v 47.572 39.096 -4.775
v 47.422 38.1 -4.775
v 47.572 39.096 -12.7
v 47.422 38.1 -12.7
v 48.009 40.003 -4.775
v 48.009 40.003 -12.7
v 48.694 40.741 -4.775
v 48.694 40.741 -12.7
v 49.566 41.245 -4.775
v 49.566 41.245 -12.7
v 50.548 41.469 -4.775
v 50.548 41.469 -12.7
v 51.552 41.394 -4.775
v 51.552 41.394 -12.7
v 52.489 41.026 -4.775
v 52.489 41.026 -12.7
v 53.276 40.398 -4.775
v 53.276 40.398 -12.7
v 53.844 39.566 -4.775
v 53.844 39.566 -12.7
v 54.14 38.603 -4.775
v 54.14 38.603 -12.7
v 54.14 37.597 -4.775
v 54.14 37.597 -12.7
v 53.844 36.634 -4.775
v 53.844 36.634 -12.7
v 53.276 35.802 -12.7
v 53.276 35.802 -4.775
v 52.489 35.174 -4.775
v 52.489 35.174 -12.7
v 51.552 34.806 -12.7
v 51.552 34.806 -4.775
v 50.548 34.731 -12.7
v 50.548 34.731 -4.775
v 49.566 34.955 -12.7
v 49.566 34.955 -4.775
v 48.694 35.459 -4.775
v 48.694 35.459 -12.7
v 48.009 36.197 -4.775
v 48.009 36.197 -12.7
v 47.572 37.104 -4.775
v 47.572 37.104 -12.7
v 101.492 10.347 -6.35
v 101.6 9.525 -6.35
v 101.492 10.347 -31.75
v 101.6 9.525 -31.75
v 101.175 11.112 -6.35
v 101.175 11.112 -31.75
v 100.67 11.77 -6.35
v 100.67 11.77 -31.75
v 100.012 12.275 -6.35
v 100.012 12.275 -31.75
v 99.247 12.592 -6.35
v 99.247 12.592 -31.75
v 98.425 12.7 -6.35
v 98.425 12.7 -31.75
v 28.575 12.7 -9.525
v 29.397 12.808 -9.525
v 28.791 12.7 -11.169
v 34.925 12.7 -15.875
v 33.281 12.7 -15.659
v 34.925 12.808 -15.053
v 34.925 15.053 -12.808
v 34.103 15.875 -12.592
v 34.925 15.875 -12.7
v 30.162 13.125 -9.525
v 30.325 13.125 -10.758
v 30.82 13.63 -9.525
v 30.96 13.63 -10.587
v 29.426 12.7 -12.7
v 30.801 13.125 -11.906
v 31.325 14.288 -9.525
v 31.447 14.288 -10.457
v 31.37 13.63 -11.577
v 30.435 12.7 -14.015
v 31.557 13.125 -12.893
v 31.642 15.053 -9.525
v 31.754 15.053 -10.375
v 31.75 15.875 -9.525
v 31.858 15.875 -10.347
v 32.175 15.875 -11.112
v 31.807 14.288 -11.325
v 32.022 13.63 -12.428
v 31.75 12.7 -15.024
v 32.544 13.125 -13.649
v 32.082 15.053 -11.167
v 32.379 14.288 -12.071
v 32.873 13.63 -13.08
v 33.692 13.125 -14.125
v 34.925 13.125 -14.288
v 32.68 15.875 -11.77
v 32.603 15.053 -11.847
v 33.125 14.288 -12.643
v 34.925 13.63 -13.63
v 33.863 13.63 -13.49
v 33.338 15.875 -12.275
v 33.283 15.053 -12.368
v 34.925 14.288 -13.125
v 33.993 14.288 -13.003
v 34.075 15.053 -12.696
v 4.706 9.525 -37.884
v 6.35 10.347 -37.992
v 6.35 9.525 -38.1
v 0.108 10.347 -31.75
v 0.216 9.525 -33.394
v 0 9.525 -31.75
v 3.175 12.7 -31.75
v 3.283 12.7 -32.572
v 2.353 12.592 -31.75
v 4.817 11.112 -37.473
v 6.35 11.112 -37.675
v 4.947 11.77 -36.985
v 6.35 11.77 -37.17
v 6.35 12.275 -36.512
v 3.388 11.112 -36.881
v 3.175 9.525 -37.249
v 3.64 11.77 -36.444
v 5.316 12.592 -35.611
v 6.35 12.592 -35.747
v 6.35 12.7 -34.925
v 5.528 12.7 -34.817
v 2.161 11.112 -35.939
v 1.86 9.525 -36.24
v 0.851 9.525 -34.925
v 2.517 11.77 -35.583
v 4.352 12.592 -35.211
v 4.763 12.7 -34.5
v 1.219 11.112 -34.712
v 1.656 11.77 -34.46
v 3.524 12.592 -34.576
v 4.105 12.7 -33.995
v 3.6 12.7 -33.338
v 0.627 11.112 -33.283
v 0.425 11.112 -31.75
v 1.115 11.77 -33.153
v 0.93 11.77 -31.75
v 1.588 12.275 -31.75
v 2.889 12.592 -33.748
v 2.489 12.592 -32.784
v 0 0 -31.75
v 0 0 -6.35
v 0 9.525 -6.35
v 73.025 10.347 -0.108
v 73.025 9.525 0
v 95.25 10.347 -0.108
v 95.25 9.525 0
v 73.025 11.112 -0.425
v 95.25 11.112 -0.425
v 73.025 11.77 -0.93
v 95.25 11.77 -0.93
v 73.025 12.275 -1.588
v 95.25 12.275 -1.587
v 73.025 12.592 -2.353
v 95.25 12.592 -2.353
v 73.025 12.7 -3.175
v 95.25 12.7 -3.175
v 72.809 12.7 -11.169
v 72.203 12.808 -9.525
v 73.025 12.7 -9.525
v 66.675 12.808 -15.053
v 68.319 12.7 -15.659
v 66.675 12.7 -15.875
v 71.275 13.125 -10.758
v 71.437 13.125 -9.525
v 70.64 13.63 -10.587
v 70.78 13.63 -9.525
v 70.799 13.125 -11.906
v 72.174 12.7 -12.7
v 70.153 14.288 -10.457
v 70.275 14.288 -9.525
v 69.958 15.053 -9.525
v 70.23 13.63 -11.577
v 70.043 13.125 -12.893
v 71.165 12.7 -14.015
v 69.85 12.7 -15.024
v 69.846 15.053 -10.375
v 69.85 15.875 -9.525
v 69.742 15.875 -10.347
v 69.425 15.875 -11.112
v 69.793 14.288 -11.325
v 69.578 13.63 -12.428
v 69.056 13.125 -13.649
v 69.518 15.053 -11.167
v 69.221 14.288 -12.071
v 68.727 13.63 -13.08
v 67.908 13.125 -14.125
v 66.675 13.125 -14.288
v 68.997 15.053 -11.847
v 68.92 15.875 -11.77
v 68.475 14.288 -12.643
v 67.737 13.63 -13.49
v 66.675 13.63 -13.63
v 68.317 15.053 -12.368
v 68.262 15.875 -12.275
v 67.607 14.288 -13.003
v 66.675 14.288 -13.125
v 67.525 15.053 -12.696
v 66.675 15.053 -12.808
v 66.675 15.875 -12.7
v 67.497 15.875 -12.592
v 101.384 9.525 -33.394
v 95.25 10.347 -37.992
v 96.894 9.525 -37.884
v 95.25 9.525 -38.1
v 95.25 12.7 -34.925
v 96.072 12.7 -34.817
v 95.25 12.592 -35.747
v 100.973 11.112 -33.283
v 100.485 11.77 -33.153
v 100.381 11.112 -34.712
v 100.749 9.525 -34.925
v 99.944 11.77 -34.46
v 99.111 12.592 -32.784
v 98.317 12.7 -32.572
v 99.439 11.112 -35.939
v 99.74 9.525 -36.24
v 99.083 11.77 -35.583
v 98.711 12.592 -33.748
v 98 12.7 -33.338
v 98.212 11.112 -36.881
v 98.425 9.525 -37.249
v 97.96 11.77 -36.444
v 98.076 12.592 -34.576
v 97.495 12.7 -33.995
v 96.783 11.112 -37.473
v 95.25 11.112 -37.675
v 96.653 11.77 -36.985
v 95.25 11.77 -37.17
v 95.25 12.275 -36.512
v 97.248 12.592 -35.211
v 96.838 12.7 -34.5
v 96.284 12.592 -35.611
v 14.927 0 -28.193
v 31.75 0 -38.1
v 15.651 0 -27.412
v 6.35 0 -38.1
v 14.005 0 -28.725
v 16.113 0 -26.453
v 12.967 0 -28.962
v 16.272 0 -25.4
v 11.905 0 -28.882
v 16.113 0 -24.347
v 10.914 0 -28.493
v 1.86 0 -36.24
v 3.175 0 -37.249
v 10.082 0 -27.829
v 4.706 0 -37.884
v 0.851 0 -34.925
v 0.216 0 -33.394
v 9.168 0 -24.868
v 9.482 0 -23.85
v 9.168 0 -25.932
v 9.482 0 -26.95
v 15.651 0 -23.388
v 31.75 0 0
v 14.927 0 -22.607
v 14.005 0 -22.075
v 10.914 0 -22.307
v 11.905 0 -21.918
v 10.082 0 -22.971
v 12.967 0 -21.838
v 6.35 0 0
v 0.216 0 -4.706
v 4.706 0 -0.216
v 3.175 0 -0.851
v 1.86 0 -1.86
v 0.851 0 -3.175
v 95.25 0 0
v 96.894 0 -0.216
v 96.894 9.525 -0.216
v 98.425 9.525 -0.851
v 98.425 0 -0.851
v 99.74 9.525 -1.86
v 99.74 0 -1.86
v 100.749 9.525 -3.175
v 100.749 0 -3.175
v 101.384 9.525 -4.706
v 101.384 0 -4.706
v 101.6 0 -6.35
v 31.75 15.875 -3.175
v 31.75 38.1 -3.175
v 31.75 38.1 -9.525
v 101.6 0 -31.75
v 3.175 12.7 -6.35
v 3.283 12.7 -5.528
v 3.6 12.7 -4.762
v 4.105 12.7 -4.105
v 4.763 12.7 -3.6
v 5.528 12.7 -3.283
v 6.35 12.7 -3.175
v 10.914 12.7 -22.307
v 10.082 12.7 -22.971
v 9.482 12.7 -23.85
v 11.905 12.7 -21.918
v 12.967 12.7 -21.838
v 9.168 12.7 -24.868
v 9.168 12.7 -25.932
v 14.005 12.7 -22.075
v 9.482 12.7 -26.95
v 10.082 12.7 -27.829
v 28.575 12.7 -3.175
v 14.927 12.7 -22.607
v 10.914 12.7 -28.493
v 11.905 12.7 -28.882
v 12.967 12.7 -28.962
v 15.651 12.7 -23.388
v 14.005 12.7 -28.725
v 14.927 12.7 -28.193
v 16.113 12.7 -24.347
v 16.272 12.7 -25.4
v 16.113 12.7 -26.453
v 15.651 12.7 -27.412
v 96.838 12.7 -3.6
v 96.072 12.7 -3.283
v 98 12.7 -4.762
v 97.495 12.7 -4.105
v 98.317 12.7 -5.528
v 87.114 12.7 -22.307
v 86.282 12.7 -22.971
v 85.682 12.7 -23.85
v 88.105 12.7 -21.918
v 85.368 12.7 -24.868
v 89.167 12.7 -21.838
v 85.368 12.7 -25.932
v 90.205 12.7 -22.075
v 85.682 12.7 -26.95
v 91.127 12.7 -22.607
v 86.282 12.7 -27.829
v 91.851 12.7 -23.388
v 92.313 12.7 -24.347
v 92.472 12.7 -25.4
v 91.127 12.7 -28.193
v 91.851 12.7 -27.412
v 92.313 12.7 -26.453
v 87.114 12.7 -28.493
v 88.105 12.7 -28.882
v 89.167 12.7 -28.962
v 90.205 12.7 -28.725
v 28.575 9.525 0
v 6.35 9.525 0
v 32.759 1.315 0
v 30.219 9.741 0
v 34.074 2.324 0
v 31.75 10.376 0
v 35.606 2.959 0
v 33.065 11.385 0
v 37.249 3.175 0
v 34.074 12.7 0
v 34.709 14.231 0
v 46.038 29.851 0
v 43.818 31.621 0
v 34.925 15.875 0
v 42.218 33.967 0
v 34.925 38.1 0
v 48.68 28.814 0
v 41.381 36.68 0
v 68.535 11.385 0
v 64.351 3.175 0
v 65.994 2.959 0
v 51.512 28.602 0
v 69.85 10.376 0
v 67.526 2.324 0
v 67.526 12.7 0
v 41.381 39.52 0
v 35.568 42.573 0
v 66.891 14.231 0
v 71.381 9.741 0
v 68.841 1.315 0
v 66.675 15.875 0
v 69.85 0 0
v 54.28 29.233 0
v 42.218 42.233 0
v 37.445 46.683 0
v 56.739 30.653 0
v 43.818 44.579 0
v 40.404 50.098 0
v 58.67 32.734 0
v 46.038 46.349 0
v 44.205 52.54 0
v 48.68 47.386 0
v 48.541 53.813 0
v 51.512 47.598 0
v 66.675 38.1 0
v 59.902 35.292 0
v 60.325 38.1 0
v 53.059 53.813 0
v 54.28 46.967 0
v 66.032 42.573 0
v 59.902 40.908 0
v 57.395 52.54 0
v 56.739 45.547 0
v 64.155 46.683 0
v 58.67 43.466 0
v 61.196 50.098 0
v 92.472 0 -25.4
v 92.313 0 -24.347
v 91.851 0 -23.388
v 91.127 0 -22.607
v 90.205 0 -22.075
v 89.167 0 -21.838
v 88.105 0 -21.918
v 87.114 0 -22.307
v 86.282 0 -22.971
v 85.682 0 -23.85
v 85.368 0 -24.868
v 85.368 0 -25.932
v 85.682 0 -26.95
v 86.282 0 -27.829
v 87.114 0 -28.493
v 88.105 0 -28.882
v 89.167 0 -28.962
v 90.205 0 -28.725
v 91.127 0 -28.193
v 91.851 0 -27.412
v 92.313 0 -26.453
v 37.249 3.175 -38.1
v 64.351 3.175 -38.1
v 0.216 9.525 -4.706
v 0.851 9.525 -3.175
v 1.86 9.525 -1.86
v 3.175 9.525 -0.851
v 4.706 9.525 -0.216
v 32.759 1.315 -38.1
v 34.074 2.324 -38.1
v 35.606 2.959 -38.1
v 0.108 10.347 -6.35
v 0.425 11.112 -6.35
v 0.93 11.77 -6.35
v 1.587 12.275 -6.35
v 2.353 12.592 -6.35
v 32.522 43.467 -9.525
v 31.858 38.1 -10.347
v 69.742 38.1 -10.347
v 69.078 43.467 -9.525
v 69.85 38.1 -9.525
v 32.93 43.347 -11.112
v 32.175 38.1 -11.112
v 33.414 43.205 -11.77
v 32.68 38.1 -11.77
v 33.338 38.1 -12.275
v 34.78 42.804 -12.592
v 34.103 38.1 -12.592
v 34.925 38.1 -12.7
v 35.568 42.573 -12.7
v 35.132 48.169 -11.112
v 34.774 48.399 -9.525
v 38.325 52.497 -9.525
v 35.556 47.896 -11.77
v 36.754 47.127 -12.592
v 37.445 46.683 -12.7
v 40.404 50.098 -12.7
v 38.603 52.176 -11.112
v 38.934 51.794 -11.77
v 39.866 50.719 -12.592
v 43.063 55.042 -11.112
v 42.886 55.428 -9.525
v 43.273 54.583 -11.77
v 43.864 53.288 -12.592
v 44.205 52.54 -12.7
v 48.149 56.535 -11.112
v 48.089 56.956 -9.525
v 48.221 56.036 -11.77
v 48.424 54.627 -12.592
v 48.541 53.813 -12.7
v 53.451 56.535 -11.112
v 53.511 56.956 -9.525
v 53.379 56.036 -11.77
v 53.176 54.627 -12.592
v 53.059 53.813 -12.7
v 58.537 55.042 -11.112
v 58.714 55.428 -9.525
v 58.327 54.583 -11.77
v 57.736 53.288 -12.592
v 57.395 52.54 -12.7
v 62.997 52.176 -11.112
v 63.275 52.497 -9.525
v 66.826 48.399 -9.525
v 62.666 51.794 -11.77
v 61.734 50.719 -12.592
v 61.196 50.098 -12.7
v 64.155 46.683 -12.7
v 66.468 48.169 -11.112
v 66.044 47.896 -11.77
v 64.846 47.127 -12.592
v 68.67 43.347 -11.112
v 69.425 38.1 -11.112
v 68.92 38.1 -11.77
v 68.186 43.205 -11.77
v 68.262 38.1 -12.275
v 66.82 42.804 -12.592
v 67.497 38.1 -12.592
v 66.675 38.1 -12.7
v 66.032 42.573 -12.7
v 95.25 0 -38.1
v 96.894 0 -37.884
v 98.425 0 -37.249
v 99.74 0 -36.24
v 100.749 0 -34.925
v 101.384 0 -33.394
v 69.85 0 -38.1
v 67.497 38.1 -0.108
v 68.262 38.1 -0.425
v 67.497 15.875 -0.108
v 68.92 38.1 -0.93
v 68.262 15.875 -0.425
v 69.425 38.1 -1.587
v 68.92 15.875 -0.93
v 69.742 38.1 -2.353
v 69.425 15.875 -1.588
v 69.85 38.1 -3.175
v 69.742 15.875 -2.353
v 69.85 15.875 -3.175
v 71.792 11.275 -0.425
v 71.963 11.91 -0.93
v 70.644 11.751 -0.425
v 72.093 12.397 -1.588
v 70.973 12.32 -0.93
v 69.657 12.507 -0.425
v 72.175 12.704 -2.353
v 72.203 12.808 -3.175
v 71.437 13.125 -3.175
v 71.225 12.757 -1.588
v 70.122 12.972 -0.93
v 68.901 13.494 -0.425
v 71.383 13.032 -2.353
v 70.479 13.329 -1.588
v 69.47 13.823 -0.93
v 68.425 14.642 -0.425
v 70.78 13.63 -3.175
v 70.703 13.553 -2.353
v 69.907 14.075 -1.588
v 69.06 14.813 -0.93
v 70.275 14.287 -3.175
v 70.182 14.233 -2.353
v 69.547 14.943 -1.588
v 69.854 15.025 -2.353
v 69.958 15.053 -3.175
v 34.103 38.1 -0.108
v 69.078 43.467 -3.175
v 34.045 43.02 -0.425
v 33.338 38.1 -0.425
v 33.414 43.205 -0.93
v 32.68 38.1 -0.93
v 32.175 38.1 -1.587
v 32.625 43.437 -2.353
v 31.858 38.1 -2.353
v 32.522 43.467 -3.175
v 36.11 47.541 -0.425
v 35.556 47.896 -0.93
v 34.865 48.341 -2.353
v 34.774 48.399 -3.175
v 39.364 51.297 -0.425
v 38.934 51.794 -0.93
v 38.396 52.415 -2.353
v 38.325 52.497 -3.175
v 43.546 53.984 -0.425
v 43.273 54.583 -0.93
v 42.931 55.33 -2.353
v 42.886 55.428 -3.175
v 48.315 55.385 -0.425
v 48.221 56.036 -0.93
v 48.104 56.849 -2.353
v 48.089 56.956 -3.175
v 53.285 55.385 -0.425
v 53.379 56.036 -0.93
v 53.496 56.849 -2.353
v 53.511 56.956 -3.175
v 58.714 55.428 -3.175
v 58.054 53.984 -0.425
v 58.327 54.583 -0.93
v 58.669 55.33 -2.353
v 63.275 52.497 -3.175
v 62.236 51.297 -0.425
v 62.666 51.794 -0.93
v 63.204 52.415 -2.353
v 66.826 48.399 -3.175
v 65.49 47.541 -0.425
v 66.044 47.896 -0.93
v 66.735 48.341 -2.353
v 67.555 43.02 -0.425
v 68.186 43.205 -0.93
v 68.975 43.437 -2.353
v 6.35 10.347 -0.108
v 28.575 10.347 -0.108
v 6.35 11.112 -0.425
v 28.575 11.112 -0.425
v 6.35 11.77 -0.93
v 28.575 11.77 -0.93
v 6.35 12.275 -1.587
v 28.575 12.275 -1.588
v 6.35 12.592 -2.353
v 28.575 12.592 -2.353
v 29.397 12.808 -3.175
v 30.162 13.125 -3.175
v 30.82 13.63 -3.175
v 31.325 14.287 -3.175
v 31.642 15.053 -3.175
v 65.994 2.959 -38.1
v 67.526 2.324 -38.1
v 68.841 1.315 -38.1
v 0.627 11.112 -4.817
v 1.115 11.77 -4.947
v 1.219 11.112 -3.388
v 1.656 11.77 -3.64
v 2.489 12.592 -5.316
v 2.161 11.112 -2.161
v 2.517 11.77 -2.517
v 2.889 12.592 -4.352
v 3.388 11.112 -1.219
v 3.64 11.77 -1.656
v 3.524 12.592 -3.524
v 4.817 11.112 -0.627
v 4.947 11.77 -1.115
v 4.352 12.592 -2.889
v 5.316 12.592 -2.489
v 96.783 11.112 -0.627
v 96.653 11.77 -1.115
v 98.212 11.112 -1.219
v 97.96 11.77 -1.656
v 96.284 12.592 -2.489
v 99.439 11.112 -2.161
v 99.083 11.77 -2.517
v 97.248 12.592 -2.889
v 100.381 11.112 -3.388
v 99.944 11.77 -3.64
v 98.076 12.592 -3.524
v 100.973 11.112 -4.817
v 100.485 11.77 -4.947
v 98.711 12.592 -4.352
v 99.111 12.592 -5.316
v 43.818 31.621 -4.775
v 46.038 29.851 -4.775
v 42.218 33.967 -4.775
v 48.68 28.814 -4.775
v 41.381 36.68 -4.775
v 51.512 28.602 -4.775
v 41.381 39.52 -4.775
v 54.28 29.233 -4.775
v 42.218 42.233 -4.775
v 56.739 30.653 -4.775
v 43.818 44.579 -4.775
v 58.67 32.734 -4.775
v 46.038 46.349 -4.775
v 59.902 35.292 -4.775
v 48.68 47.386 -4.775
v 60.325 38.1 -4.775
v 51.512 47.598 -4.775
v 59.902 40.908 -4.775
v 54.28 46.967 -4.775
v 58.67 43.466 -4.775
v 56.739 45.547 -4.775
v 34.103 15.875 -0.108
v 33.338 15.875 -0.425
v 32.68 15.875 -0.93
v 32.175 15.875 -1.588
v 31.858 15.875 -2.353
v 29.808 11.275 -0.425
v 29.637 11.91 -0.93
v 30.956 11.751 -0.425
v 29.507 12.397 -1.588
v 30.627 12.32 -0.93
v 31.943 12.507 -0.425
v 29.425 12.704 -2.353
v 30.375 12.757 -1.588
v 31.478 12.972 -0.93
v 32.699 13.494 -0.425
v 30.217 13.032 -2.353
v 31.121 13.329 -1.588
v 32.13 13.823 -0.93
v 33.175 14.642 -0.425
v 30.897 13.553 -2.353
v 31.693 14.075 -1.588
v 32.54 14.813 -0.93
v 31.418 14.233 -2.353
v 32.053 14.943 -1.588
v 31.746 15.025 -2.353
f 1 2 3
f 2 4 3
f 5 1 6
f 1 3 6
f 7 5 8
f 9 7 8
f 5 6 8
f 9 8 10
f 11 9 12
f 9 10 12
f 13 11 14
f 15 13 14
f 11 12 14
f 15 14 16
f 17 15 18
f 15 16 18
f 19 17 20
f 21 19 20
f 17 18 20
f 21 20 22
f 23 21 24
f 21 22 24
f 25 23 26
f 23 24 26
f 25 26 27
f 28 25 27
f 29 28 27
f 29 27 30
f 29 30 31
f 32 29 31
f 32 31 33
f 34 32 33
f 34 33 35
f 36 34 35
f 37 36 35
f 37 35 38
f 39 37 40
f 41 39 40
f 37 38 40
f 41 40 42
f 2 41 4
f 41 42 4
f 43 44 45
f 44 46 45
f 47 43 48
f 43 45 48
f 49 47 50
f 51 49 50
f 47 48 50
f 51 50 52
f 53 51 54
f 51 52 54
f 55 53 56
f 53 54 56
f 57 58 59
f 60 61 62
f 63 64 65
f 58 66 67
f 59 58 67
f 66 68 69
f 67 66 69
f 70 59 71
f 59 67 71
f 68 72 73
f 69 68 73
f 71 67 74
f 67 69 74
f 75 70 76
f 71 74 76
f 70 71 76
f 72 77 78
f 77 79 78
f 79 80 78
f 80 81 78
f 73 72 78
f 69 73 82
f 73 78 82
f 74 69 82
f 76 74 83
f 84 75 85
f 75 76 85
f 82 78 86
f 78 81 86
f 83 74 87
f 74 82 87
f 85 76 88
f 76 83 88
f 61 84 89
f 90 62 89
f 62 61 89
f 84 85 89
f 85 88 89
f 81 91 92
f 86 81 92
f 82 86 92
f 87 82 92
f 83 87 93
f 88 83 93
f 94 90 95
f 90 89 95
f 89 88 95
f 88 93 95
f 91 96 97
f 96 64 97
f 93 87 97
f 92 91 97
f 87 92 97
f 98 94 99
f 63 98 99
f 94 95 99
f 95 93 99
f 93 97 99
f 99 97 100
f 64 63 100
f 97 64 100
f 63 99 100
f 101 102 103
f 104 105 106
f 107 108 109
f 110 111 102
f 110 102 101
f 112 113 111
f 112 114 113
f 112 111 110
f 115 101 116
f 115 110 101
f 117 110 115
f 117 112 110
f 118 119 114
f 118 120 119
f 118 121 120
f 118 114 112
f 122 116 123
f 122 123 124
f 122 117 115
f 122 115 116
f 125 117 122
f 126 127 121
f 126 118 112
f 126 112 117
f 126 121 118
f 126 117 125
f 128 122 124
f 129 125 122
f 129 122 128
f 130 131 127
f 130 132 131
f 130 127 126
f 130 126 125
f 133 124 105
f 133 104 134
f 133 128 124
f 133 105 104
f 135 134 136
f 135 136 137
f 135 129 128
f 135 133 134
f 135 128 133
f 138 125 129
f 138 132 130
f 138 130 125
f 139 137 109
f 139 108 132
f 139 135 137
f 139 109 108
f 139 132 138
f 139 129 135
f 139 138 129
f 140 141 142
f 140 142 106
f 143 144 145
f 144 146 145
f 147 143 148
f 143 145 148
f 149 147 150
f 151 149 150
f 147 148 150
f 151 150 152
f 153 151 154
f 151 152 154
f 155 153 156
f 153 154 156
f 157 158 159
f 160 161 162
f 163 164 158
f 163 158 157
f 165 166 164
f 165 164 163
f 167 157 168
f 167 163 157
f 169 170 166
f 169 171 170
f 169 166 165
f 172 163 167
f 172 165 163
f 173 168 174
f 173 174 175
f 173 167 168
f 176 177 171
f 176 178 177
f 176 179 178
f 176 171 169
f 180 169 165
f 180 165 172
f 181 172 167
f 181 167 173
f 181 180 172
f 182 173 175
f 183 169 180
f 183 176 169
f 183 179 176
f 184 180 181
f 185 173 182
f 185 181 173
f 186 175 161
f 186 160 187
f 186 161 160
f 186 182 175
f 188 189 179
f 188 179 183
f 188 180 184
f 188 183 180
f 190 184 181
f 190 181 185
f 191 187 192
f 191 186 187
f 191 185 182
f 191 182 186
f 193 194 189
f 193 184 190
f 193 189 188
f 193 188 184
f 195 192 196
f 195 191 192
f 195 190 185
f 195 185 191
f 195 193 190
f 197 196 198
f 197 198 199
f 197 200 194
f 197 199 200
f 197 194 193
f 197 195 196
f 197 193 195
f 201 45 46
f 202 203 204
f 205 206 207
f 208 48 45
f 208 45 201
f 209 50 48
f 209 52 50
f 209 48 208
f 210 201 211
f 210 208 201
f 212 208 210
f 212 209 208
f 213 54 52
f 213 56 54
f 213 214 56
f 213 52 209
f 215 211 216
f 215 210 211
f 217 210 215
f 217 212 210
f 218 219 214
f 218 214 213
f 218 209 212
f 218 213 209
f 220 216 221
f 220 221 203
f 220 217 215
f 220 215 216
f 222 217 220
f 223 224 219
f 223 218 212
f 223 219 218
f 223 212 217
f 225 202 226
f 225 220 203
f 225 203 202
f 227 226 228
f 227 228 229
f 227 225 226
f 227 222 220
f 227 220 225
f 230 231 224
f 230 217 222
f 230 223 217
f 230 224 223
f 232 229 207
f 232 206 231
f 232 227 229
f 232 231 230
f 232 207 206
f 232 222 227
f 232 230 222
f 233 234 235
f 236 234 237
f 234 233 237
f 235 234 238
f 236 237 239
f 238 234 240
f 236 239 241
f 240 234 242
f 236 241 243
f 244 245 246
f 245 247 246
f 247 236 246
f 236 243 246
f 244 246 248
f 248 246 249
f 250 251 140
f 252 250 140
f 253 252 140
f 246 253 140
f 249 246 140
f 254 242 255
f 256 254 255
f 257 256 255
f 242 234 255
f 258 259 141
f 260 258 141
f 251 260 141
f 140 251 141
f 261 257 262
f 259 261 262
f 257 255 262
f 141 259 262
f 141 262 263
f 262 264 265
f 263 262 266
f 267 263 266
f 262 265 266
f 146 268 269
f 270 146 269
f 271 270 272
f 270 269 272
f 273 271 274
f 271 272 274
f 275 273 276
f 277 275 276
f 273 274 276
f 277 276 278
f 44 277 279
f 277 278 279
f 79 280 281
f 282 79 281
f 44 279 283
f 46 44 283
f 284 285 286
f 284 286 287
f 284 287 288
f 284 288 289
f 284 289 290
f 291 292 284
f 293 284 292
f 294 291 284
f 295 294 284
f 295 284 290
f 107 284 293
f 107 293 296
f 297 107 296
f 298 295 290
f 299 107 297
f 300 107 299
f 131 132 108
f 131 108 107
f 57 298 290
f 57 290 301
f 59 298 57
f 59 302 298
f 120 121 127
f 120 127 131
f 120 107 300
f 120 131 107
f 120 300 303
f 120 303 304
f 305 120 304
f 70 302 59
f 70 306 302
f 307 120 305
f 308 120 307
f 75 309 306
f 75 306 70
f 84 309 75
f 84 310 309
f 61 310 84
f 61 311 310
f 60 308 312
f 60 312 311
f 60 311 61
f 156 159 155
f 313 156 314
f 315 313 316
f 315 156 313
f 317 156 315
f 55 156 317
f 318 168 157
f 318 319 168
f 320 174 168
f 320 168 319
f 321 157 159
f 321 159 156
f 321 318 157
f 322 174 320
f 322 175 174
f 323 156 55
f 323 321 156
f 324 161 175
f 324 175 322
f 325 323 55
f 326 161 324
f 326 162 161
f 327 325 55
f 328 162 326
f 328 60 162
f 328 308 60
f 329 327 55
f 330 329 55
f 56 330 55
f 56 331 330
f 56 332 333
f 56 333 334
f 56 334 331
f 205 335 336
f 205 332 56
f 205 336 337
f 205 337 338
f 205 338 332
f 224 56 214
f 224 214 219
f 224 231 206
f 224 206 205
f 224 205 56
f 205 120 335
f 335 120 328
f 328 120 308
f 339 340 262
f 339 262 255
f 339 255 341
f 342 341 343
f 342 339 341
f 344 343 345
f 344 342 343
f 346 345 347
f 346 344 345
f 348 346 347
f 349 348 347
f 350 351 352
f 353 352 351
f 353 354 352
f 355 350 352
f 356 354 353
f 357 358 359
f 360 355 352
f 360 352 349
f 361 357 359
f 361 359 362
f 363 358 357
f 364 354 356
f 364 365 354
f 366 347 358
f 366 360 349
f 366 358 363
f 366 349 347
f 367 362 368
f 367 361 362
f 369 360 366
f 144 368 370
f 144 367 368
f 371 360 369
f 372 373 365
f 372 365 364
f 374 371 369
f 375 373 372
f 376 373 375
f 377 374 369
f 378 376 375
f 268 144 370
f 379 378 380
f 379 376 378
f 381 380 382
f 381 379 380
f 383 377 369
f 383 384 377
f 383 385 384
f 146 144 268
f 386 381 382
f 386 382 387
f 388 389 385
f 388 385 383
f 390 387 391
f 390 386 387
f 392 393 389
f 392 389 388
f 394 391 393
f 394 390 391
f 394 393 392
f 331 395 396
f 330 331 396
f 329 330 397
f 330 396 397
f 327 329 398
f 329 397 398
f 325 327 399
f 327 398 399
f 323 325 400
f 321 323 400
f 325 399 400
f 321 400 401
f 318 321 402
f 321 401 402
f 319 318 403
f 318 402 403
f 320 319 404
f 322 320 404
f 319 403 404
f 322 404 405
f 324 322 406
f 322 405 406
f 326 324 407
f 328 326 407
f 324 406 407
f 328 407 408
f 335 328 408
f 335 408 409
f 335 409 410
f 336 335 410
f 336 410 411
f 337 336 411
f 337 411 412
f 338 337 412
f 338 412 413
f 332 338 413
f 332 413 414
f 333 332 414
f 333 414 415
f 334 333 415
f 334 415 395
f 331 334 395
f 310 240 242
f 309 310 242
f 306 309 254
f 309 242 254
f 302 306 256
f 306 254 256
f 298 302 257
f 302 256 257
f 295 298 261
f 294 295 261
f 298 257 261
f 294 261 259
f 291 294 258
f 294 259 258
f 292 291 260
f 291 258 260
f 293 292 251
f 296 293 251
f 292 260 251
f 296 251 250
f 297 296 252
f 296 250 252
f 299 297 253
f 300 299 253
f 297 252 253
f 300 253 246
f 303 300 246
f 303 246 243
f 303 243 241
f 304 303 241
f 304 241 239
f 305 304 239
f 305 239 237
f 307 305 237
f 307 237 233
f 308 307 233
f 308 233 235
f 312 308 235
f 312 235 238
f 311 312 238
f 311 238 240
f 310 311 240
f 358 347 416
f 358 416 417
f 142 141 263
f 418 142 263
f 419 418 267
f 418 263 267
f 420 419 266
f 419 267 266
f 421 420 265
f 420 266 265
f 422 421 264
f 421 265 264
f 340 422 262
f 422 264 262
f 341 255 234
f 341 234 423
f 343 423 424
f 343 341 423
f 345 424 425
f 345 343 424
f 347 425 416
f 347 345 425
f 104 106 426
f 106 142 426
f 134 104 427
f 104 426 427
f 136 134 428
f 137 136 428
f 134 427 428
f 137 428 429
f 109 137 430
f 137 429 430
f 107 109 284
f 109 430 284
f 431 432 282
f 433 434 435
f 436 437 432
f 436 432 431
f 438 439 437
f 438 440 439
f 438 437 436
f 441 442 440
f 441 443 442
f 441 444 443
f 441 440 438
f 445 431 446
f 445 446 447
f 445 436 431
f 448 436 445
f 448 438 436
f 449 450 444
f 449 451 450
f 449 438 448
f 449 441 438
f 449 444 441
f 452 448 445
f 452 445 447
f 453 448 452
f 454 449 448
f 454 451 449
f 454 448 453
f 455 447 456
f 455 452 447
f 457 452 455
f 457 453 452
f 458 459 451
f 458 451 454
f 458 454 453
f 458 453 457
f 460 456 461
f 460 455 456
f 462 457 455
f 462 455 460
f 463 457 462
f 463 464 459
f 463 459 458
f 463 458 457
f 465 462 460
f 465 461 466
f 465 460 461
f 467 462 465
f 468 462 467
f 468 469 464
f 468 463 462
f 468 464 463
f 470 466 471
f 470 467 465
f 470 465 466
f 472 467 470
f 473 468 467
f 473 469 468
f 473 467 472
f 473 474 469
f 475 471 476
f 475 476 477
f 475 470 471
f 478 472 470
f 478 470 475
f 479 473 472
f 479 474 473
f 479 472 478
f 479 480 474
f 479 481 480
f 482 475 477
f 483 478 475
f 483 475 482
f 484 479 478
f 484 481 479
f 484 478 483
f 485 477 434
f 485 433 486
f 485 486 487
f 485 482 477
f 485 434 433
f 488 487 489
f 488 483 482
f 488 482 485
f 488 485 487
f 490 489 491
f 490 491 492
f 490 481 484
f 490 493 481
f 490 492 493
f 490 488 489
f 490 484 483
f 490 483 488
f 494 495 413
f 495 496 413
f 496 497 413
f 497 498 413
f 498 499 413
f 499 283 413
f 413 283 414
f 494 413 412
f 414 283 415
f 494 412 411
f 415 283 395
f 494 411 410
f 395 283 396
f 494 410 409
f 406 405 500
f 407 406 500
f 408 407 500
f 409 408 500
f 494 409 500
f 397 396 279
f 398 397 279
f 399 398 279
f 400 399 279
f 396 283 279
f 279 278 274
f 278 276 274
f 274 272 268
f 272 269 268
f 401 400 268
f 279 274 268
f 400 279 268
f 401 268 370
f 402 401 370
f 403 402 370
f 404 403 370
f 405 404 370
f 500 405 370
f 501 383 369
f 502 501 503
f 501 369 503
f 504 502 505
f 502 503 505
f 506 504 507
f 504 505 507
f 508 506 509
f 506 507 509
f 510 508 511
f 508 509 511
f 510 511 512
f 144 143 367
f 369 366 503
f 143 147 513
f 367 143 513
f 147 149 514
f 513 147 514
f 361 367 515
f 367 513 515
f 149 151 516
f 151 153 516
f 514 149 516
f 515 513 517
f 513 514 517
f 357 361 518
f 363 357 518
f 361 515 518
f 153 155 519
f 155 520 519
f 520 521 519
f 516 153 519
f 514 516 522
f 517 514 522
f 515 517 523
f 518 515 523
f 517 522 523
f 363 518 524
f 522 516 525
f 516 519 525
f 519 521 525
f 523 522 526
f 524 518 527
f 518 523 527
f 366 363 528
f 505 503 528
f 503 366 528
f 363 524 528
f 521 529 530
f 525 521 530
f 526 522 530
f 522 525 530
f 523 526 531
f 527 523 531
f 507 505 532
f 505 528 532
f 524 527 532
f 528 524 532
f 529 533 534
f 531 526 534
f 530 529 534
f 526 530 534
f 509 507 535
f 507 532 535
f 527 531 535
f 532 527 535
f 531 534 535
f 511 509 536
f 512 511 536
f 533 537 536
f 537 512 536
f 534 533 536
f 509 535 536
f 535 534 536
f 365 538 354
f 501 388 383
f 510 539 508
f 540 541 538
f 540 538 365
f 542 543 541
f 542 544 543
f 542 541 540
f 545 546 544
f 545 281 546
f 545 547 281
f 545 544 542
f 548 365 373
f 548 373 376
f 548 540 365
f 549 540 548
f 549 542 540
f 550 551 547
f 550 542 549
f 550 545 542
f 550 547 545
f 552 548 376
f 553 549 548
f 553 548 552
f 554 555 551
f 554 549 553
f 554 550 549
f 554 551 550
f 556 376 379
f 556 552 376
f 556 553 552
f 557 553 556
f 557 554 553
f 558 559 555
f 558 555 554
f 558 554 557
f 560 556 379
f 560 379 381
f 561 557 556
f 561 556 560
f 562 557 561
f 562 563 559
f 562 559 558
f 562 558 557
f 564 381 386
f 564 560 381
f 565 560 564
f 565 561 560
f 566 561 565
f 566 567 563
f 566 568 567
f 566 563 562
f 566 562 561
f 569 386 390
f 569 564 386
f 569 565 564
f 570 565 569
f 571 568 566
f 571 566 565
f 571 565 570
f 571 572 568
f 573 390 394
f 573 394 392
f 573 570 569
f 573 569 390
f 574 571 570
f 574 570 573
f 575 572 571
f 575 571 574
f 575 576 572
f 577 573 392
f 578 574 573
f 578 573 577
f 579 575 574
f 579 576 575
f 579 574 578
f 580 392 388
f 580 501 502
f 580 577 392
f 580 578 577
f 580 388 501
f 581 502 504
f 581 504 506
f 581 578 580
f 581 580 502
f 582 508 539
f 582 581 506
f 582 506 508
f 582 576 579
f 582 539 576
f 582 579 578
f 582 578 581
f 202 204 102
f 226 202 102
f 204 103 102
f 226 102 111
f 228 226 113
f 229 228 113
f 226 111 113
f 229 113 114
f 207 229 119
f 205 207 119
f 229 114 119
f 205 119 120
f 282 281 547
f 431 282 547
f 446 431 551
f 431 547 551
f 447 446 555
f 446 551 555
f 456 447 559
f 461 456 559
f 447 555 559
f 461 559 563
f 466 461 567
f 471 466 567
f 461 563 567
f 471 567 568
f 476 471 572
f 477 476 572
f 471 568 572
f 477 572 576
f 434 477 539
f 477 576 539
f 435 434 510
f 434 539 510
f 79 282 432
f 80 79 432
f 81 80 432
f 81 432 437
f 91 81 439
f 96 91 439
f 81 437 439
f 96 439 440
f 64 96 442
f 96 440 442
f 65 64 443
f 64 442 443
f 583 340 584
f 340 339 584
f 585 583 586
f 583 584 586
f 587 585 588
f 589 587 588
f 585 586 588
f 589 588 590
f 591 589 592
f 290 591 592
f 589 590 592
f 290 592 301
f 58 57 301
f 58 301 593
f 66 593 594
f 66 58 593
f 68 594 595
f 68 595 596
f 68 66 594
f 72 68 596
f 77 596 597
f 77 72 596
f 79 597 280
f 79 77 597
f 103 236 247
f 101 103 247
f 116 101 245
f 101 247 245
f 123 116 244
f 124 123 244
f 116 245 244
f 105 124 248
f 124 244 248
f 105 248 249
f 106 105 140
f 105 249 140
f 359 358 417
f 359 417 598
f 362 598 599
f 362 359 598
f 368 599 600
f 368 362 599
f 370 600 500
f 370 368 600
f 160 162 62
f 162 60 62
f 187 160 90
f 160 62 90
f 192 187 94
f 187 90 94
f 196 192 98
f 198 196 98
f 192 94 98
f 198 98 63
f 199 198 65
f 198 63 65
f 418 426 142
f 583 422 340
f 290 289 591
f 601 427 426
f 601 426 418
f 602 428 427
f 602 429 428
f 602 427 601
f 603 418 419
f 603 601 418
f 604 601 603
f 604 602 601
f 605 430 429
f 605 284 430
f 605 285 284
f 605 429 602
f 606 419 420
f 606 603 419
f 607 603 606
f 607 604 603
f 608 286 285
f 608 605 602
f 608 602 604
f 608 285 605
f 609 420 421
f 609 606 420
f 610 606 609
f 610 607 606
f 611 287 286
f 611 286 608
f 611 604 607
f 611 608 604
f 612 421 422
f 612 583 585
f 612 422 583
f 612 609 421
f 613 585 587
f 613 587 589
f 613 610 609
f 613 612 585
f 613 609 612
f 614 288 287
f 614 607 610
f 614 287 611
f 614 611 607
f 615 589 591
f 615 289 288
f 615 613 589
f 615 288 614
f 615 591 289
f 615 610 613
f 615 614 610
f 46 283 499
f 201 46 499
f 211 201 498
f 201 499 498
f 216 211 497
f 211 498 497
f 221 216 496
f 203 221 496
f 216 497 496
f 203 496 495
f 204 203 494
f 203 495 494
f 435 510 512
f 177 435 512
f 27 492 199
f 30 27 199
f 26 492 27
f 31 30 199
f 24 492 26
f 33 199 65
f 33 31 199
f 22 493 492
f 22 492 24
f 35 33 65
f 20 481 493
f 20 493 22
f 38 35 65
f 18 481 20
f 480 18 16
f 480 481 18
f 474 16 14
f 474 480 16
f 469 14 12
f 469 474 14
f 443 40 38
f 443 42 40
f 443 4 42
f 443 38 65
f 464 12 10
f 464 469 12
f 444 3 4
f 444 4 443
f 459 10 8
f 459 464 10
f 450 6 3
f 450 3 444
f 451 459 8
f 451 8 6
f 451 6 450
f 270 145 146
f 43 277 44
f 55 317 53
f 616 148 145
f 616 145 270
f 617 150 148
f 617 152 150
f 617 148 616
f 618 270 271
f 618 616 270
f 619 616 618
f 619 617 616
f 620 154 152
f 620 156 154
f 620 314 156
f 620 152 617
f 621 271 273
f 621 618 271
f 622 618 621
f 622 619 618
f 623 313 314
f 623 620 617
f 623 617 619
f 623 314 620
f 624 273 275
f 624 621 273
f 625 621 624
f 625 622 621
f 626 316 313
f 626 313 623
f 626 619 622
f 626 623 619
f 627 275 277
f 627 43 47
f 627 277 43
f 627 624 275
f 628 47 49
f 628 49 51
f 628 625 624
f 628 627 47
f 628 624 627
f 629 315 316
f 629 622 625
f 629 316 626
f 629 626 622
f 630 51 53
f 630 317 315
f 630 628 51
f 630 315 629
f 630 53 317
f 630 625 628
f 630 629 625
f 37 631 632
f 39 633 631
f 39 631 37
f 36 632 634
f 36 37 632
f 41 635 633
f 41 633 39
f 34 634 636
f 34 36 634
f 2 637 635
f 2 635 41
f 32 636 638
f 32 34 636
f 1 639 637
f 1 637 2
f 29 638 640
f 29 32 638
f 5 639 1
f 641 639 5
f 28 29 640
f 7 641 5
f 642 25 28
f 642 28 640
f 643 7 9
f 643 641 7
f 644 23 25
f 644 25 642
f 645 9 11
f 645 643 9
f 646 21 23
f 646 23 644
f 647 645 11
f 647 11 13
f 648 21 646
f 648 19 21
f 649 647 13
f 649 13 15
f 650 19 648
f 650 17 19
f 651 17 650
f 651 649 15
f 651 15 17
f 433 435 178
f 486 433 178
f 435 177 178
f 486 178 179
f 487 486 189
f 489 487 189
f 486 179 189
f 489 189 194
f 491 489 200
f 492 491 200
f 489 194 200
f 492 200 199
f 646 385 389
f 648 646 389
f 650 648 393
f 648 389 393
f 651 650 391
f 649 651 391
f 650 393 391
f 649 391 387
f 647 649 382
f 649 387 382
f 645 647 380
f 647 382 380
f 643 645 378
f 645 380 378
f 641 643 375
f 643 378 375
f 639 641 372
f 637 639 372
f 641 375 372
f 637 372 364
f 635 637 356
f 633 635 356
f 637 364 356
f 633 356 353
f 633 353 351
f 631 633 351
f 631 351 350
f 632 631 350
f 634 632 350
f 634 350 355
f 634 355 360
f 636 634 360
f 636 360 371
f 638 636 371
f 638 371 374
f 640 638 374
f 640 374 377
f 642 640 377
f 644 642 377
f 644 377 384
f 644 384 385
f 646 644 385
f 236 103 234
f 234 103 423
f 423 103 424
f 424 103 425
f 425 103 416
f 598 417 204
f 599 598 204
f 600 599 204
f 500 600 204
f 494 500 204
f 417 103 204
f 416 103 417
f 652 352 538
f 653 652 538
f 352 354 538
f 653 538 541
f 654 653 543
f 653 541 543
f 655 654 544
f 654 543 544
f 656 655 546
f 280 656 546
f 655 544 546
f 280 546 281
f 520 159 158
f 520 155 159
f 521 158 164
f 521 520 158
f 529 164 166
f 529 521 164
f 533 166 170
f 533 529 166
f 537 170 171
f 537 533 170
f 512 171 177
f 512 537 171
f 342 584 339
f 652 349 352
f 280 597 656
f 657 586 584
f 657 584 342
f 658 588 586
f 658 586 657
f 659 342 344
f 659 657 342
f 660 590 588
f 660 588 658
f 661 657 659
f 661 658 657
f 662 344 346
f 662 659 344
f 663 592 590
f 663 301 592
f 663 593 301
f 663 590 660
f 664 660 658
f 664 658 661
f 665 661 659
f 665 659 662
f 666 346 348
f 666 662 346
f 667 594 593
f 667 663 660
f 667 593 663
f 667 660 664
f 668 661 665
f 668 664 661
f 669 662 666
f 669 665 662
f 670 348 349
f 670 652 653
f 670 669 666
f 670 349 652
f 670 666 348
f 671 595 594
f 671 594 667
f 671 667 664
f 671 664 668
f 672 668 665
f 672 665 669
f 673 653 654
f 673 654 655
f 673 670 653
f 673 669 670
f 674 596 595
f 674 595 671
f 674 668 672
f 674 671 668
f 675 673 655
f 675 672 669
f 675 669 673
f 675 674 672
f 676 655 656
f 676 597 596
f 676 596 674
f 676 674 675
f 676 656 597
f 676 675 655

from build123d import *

# Parameters (mm, degrees)
SKETCH1_W                                = 101.6
SKETCH1_H                                = 38.1
BASE_EXTRUDE_DEPTH                       = 12.7
BOSS_EXTRUDE1_DEPTH                      = 12.7
CBORE_FOR_1_4_HEX_HEAD_BOLT1_D           = 6.7564
CBORE_FOR_1_4_HEX_HEAD_BOLT1_CBORE_D     = 19.05
CBORE_FOR_1_4_HEX_HEAD_BOLT1_CBORE_DEPTH = 4.7752
SKETCH10_W                               = 38.1
SKETCH10_H                               = 3.175
CUT_EXTRUDE1_DEPTH                       = 123.994494021
F_9_32_0_28125_DIAMETER_HOLE1_D          = 7.14375
FILLET1_R                                = 6.35
FILLET2_R                                = 3.175


with BuildPart() as part:
    # Sketch1 → Base-Extrude (new body)
    with BuildSketch(Plane(origin=(0, 0, 0), x_dir=(1, 0, 0), z_dir=(0, 1, 0))):
        with Locations((50.8, 19.05)):
            Rectangle(SKETCH1_W, SKETCH1_H)
    extrude(amount=BASE_EXTRUDE_DEPTH)

    # Sketch2 → Boss-Extrude1 (add)
    with BuildSketch(Plane.XY):
        with BuildLine():
            Line((31.75, 0), (31.75, 38.1))
            ThreePointArc((31.75, 38.1), (50.8, 57.15), (69.85, 38.1))
            Line((69.85, 38.1), (69.85, 0))
            Line((69.85, 0), (31.75, 0))
        make_face()
    extrude(amount=-BOSS_EXTRUDE1_DEPTH)

    # CBORE for 1/4 Hex Head Bolt1 (through all)
    with Locations(Plane(origin=(1.103556277, -5.640959644, 0), x_dir=(1, 0, 0), z_dir=(0, 0, 1))):
        with Locations((49.696443723, 43.740959644)):
            CounterBoreHole(CBORE_FOR_1_4_HEX_HEAD_BOLT1_D / 2, CBORE_FOR_1_4_HEX_HEAD_BOLT1_CBORE_D / 2, CBORE_FOR_1_4_HEX_HEAD_BOLT1_CBORE_DEPTH)

    # Sketch10 → Cut-Extrude1 (cut, through all)
    with BuildSketch(Plane(origin=(-1.071270925, 1.162093394, 0), x_dir=(1, 0, 0), z_dir=(0, 0, 1))):
        with Locations((51.871270925, 0.425406606)):
            Rectangle(SKETCH10_W, SKETCH10_H)
    extrude(amount=-CUT_EXTRUDE1_DEPTH, mode=Mode.SUBTRACT)

    # 9/32 (0.28125) Diameter Hole1 (through all)
    with Locations(Plane(origin=(45.908148148, 12.7, 7.855185185), x_dir=(-1, 0, 0), z_dir=(0, 1, 0))):
        with Locations((-42.991851852, -33.255185185), (33.208148148, -33.255185185)):
            Hole(F_9_32_0_28125_DIAMETER_HOLE1_D / 2)

    # Fillet1
    # the kernel refuses this fillet: 6.35 mm, written as the material it adds along each edge
    with BuildSketch(Plane(origin=(31.75, 3.175, 0), x_dir=(0, -1, 0), z_dir=(0, 0, -1))) as fillet1_piece_1:
        with BuildLine():
            CenterArc((6.35, -5.499261314), FILLET1_R, 120, 60)
            Line((0, -5.499261314), (0, 0))
            Line((0, 0), (3.175, 0))
        make_face()
    extrude(amount=38.1)
    with BuildSketch(Plane(origin=(69.85, 3.175, 0), x_dir=(-1, 0, 0), z_dir=(0, 0, -1))) as fillet1_piece_2:
        with BuildLine():
            CenterArc((5.499261314, -6.35), FILLET1_R, 90, 60)
            Line((0, -3.175), (0, 0))
            Line((0, 0), (5.499261314, 0))
        make_face()
    extrude(amount=38.1)
    # the kernel refuses this fillet: 6.35 mm, written as the material it takes off along each edge
    with BuildSketch(Plane(origin=(0, -15.875, -38.1), x_dir=(0, 0, 1), z_dir=(0, 1, 0)), Plane(origin=(0, -15.875, 0), x_dir=(1, 0, 0), z_dir=(0, 1, 0))) as fillet1_2_piece_1:
        with BuildLine():
            CenterArc((FILLET1_R, FILLET1_R), FILLET1_R, 180, 90)
            Line((0, FILLET1_R), (0, 0))
            Line((0, 0), (FILLET1_R, 0))
        make_face()
    extrude(amount=44.45, mode=Mode.SUBTRACT)
    with BuildSketch(Plane(origin=(101.6, -15.875, -38.1), x_dir=(0, 0, 1), z_dir=(0, 1, 0)), Plane(origin=(101.6, -15.875, 0), x_dir=(-1, 0, 0), z_dir=(0, 1, 0))) as fillet1_2_piece_2:
        with BuildLine():
            CenterArc((FILLET1_R, -FILLET1_R), FILLET1_R, 90, 90)
            Line((0, -FILLET1_R), (0, 0))
            Line((0, 0), (FILLET1_R, 0))
        make_face()
    extrude(amount=44.45, mode=Mode.SUBTRACT)

    # Fillet2
    fillet2_edges = [part.edges().sort_by_distance(p)[0] for p in [
        (82.55, 12.7, 0),
        (31.75, 25.4, -12.7),
        (69.85, 25.4, -12.7),
        (31.75, 25.4, 0),
        (69.85, 25.4, 0),
        (50.8, 57.15, 0),
        (31.75, 12.7, -6.35),
        (50.8, 57.15, -12.7),
        (69.85, 12.7, -6.35),
        (50.8, 12.7, -12.7),
        (19.05, 12.7, 0),
        (0, 12.7, -19.05),
        (101.6, 12.7, -19.05),
        (50.8, 12.7, -38.1),
        (1.859871939, 12.7, -36.240128061),
        (99.740128061, 12.7, -36.240128061),
        (99.740128061, 12.7, -1.859871939),
        (1.859871939, 12.7, -1.859871939),
    ]]
    fillet(fillet2_edges, radius=FILLET2_R)


solid = part.part
